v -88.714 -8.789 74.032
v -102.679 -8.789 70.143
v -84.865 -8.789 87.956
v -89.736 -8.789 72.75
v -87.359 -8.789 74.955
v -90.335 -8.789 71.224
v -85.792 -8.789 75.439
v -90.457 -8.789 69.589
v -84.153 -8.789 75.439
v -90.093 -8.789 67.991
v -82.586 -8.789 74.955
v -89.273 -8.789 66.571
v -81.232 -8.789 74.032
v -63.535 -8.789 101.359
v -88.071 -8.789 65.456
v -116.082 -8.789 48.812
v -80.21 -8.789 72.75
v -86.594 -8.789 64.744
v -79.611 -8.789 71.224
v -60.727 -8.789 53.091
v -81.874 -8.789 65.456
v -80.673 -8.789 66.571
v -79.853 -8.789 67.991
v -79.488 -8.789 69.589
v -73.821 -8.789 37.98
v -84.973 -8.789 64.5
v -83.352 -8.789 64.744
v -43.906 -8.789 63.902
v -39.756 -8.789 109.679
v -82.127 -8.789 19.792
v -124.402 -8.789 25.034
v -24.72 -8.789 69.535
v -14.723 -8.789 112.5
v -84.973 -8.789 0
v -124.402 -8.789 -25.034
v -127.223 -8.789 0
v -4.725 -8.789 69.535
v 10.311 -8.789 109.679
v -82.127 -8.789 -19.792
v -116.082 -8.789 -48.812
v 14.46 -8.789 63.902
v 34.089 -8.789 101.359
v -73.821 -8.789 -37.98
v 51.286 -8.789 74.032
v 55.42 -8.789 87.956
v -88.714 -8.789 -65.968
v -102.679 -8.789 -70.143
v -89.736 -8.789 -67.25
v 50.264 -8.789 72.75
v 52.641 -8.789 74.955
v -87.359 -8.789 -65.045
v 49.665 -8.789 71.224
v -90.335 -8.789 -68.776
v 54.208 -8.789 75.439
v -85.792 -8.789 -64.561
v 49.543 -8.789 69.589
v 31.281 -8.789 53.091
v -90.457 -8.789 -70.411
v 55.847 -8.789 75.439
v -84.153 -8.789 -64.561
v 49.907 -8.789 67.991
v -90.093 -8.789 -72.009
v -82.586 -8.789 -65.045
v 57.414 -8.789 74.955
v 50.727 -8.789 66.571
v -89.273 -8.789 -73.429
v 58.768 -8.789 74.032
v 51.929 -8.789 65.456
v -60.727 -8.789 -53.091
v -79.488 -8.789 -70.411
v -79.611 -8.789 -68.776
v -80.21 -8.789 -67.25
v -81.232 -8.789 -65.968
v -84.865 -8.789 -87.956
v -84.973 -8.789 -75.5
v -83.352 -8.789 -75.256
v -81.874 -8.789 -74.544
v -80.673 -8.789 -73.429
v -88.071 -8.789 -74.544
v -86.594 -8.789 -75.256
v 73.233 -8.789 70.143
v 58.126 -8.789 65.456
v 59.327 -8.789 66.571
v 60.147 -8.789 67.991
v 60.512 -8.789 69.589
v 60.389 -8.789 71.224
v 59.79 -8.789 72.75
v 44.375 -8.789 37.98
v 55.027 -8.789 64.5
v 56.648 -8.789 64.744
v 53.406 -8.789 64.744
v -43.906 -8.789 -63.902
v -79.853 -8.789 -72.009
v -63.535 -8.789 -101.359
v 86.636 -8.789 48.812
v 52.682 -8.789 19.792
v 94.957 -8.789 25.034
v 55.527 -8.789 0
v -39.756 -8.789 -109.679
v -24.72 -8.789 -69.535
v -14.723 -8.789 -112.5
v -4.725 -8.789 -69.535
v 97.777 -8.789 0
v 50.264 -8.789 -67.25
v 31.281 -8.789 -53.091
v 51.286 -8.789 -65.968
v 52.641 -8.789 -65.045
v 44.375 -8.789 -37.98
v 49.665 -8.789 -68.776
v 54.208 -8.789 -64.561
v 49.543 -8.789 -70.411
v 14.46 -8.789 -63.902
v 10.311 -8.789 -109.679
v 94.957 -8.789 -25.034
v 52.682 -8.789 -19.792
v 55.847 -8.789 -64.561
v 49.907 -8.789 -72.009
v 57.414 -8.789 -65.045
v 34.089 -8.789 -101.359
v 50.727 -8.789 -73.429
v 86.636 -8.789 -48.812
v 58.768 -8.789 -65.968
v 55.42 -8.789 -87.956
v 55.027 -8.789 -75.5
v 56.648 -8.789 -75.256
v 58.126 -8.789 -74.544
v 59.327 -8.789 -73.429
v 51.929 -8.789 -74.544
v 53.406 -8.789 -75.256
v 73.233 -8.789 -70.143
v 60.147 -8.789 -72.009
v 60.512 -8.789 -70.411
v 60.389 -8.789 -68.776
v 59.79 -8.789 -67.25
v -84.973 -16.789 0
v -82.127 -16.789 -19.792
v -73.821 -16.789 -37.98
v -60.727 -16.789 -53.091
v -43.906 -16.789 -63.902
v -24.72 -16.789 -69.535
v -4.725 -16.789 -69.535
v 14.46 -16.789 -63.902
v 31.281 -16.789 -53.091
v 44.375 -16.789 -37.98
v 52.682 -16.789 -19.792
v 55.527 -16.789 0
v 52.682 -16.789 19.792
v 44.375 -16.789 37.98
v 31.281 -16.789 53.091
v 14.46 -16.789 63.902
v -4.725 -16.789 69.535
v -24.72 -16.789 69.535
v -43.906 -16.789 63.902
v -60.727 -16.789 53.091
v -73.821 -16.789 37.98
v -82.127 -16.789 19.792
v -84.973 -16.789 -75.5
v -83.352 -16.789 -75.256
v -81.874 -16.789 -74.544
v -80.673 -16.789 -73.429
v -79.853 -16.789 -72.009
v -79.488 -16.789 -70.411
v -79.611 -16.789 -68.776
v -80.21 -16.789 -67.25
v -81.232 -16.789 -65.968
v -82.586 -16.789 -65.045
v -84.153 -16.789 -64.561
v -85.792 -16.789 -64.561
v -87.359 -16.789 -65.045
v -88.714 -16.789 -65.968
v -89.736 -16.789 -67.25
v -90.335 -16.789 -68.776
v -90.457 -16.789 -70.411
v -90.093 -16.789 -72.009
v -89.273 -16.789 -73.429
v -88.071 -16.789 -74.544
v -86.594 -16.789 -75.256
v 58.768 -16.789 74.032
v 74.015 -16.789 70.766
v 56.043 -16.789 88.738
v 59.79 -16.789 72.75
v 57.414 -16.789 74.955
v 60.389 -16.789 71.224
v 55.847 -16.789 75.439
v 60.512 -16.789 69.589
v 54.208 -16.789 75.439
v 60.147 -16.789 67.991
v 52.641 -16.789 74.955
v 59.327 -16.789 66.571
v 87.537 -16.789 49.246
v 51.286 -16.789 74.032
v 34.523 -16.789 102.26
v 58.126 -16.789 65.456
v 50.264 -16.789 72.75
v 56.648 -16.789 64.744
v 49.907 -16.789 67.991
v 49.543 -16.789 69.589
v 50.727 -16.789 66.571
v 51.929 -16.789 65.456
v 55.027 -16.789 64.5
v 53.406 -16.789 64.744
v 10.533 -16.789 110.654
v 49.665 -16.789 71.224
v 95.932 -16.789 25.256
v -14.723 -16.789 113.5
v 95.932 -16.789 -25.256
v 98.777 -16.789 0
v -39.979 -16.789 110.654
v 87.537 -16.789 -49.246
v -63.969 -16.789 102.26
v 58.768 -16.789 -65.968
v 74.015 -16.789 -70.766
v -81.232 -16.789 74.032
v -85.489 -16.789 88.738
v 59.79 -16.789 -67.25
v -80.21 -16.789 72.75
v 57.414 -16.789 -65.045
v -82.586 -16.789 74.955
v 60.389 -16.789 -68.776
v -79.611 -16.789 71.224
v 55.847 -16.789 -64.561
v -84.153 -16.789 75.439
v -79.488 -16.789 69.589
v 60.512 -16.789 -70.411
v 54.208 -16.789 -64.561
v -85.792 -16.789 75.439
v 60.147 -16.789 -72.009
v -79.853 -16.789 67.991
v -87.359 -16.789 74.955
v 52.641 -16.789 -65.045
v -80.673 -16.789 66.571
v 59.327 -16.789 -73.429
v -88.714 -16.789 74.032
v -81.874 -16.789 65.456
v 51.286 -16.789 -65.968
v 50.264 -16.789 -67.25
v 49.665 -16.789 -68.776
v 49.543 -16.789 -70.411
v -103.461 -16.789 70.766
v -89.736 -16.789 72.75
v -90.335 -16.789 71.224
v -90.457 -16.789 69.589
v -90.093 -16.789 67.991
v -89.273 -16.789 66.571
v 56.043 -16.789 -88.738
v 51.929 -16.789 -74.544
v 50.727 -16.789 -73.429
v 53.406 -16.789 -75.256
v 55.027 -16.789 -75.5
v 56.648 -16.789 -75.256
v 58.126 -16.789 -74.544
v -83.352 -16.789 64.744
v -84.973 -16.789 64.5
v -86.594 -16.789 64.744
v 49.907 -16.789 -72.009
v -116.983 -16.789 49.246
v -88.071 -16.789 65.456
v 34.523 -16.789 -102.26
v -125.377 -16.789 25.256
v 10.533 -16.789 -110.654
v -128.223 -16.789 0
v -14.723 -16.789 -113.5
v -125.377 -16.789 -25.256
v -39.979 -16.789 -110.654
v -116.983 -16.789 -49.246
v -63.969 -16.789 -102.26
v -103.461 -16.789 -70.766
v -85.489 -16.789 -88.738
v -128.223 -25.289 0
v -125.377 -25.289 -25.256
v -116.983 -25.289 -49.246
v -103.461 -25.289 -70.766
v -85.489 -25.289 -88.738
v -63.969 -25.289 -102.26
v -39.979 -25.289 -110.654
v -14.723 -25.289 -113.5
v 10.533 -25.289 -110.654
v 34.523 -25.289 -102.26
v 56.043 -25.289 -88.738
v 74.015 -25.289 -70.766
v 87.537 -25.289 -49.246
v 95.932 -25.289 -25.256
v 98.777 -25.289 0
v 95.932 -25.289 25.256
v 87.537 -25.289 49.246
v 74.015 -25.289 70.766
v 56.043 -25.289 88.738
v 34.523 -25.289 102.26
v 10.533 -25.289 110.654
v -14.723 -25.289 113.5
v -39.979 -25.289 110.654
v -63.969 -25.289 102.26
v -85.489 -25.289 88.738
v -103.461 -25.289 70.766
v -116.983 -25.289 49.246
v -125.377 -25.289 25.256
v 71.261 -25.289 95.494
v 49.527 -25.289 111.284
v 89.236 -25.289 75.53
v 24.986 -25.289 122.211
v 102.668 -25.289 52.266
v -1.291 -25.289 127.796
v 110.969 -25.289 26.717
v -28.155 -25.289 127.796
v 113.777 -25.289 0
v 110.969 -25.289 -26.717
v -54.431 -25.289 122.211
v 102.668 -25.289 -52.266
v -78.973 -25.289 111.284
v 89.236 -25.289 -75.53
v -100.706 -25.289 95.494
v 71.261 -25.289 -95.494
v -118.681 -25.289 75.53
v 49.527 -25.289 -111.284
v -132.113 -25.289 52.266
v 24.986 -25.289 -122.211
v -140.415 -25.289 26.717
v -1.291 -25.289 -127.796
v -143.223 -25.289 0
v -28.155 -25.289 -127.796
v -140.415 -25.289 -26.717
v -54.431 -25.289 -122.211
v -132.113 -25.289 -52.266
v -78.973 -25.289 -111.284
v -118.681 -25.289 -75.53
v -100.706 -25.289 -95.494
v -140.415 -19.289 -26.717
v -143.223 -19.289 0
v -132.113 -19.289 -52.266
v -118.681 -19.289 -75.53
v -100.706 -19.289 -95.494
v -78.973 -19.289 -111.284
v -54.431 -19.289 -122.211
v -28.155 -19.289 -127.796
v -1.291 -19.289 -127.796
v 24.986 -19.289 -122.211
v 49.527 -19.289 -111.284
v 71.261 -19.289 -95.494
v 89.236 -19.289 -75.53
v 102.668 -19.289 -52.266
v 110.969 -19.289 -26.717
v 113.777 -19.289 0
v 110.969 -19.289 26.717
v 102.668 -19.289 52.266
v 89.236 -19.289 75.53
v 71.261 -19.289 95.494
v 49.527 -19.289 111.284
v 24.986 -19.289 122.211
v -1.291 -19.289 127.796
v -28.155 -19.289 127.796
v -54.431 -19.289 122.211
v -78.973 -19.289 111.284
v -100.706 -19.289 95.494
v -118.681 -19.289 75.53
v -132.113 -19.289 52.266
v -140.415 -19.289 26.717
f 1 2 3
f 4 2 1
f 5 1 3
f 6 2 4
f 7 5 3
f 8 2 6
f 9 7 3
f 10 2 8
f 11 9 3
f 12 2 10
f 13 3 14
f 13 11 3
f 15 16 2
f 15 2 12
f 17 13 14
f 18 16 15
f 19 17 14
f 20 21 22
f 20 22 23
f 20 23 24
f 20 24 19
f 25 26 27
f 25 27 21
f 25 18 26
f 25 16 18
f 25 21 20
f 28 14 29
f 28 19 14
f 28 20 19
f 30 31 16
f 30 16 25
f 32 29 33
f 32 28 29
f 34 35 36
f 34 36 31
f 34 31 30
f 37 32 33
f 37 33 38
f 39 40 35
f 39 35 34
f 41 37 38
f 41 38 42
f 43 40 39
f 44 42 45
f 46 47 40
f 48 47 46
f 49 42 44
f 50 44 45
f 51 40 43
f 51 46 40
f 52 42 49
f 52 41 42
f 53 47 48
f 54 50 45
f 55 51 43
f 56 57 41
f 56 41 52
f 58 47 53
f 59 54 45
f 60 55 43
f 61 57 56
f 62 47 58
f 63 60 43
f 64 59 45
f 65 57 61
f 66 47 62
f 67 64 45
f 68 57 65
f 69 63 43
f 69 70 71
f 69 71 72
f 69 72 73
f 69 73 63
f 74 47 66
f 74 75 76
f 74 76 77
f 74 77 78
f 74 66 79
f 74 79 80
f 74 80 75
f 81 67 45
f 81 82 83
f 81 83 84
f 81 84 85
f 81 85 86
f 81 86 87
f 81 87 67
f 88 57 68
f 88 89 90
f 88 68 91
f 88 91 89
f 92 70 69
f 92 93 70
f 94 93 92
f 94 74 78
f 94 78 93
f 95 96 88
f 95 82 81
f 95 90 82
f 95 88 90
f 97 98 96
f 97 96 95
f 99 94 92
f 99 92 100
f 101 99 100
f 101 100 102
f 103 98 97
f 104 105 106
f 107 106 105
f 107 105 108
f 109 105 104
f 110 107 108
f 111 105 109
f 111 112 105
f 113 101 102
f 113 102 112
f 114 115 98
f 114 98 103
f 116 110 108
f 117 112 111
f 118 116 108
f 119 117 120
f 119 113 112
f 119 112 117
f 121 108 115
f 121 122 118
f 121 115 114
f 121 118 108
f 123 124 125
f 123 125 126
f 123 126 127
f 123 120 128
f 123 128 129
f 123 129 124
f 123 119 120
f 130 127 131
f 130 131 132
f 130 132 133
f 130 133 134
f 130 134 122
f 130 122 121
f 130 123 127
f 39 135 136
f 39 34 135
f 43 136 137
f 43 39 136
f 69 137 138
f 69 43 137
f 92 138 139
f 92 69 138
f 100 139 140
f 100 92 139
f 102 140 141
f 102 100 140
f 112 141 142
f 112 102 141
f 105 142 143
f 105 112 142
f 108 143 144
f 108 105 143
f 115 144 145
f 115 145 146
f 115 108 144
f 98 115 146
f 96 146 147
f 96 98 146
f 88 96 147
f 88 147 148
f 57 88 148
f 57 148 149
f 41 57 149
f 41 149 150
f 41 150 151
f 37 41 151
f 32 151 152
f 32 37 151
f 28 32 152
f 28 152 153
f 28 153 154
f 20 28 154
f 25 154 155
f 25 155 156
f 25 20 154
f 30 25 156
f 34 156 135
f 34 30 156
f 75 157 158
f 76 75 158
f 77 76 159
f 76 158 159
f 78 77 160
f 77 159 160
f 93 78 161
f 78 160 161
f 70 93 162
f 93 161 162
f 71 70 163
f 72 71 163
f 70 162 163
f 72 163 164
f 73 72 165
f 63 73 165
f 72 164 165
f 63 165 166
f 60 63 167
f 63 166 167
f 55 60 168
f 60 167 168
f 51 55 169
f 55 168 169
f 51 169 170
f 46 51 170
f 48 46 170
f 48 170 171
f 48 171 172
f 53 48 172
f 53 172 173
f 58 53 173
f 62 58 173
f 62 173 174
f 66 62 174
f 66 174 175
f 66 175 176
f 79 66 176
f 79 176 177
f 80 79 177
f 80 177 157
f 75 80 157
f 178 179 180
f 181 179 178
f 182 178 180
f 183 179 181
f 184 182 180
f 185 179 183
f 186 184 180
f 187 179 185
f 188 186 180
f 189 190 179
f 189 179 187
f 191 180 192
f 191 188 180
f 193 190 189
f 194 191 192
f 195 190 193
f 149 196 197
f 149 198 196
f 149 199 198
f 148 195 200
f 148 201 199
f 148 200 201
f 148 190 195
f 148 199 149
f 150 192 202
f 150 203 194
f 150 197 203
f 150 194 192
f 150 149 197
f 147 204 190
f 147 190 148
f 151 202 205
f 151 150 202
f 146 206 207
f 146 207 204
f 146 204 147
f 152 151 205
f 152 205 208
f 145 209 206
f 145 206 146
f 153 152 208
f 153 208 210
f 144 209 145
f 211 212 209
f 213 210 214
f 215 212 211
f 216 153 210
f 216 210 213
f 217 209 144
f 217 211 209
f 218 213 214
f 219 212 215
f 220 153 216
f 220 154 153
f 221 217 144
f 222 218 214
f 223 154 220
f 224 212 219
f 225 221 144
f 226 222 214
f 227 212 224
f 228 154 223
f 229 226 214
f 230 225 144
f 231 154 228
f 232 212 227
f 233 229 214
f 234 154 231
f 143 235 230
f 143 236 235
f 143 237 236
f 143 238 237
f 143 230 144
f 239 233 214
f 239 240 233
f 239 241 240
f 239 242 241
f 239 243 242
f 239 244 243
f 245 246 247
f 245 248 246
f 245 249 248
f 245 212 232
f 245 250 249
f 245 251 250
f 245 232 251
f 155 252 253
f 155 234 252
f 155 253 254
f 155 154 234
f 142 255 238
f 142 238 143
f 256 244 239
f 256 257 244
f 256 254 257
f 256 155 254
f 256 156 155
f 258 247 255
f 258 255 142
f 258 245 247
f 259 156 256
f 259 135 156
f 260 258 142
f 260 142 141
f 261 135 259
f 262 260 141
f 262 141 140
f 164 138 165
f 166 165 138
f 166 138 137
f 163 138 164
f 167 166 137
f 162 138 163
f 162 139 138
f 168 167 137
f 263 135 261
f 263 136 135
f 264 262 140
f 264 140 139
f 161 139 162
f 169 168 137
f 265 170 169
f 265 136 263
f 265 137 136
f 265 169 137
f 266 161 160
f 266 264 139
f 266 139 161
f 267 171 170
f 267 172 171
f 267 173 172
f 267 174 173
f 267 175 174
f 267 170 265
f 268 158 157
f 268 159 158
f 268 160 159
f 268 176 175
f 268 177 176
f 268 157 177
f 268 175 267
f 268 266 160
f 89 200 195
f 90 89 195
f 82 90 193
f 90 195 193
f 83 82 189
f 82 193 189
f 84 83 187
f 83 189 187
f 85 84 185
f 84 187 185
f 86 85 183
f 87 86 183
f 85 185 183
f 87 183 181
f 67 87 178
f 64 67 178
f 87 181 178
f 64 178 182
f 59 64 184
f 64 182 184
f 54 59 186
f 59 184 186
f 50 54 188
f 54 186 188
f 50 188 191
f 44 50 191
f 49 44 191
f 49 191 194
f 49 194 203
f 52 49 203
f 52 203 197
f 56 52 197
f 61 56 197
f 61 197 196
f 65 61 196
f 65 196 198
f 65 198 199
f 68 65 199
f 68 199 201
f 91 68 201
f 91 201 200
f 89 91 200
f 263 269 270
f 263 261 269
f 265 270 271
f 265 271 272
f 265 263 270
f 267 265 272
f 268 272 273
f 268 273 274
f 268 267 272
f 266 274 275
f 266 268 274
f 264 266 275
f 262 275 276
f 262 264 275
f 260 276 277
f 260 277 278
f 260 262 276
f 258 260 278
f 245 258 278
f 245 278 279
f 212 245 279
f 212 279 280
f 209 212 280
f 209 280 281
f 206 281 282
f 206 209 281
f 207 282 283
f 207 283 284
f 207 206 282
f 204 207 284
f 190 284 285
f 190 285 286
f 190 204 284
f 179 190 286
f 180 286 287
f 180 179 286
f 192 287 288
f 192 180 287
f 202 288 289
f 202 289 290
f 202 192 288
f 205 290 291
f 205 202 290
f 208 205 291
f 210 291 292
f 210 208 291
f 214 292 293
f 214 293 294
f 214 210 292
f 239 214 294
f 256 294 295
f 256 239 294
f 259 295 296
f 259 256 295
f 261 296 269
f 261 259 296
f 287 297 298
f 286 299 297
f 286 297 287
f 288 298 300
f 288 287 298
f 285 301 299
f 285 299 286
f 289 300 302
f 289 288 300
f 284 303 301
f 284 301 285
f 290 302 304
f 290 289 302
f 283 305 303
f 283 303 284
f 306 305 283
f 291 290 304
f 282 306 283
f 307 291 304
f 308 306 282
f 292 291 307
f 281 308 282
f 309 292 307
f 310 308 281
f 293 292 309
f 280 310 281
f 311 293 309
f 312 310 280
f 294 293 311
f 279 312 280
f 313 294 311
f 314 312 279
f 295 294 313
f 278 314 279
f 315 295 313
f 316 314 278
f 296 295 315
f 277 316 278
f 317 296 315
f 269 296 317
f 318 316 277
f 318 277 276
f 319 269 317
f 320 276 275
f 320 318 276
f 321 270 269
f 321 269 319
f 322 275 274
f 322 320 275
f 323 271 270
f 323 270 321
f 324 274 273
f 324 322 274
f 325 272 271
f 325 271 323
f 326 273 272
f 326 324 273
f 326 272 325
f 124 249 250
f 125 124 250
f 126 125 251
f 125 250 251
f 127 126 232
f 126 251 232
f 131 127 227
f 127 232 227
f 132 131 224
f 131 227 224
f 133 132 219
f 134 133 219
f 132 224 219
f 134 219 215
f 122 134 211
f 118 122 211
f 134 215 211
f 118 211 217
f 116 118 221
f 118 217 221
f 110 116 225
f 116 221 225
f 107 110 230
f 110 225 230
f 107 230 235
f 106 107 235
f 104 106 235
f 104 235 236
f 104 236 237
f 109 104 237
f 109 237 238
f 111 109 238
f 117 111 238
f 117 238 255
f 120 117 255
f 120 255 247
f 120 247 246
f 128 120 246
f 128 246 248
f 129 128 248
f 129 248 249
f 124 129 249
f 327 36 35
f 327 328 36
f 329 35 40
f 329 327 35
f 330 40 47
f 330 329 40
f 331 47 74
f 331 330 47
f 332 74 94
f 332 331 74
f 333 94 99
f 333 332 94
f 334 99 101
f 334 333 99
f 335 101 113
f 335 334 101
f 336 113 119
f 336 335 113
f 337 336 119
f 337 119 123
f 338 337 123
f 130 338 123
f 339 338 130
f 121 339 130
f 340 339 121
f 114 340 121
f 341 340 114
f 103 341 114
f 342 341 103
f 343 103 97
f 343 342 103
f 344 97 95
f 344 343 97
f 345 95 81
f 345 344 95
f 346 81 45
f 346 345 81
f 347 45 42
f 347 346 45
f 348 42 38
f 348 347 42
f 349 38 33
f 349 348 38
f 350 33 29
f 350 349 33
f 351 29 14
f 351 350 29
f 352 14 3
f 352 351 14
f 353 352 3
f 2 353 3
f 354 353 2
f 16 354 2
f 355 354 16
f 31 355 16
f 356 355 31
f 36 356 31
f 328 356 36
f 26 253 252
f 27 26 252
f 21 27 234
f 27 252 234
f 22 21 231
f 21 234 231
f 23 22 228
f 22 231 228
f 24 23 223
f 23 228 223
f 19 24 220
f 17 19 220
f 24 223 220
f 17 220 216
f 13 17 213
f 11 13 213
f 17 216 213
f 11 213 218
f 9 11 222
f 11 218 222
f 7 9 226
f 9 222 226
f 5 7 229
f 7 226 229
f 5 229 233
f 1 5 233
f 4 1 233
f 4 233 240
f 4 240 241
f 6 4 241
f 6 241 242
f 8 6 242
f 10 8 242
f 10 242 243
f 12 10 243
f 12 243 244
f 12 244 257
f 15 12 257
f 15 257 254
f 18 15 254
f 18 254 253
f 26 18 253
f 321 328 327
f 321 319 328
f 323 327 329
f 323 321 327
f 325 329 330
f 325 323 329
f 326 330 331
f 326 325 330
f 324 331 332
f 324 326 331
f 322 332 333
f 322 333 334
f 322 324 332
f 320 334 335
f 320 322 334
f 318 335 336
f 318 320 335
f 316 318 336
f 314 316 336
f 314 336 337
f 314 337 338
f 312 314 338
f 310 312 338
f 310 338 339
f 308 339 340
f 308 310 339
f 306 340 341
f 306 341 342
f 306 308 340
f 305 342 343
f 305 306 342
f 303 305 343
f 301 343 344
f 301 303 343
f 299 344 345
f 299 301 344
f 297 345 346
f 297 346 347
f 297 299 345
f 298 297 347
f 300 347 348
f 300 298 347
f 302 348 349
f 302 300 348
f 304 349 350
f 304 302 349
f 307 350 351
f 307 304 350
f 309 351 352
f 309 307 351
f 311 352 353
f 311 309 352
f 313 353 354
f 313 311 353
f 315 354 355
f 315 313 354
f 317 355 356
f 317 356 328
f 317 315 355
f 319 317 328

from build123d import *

# Parameters (mm, degrees)
SKETCH_2_R          = 5.5
CUT_EXTRUDE_1_DEPTH = 10


with BuildPart() as part:
    # 草图1 → 旋转1 (revolve)
    with BuildSketch(Plane.XY):
        Polygon((-84.972745292, -8.788732394), (-127.222745292, -8.788732394), (-143.222745292, -19.288732394), (-143.222745292, -25.288732394), (-128.222745292, -25.288732394), (-128.222745292, -16.788732394), (-84.972745292, -16.788732394), align=None)
    revolve(axis=Axis((-14.722745292, 34.411267606, 0), (0, -1, 0)))

    # 草图2 → 切除-拉伸1 (cut)
    with BuildSketch(Plane.XZ.offset(16.788732394)):
        with Locations(Location((-84.972745292, 70, 0), (0, 0, 270))):
            Circle(SKETCH_2_R)
        with Locations(Location((55.027254708, 70, 0), (0, 0, 270))):
            Circle(SKETCH_2_R)
        with Locations(Location((55.027254708, -70, 0), (0, 0, 270))):
            Circle(SKETCH_2_R)
        with Locations(Location((-84.972745292, -70, 0), (0, 0, 270))):
            Circle(SKETCH_2_R)
    extrude(amount=-CUT_EXTRUDE_1_DEPTH, mode=Mode.SUBTRACT)


solid = part.part
